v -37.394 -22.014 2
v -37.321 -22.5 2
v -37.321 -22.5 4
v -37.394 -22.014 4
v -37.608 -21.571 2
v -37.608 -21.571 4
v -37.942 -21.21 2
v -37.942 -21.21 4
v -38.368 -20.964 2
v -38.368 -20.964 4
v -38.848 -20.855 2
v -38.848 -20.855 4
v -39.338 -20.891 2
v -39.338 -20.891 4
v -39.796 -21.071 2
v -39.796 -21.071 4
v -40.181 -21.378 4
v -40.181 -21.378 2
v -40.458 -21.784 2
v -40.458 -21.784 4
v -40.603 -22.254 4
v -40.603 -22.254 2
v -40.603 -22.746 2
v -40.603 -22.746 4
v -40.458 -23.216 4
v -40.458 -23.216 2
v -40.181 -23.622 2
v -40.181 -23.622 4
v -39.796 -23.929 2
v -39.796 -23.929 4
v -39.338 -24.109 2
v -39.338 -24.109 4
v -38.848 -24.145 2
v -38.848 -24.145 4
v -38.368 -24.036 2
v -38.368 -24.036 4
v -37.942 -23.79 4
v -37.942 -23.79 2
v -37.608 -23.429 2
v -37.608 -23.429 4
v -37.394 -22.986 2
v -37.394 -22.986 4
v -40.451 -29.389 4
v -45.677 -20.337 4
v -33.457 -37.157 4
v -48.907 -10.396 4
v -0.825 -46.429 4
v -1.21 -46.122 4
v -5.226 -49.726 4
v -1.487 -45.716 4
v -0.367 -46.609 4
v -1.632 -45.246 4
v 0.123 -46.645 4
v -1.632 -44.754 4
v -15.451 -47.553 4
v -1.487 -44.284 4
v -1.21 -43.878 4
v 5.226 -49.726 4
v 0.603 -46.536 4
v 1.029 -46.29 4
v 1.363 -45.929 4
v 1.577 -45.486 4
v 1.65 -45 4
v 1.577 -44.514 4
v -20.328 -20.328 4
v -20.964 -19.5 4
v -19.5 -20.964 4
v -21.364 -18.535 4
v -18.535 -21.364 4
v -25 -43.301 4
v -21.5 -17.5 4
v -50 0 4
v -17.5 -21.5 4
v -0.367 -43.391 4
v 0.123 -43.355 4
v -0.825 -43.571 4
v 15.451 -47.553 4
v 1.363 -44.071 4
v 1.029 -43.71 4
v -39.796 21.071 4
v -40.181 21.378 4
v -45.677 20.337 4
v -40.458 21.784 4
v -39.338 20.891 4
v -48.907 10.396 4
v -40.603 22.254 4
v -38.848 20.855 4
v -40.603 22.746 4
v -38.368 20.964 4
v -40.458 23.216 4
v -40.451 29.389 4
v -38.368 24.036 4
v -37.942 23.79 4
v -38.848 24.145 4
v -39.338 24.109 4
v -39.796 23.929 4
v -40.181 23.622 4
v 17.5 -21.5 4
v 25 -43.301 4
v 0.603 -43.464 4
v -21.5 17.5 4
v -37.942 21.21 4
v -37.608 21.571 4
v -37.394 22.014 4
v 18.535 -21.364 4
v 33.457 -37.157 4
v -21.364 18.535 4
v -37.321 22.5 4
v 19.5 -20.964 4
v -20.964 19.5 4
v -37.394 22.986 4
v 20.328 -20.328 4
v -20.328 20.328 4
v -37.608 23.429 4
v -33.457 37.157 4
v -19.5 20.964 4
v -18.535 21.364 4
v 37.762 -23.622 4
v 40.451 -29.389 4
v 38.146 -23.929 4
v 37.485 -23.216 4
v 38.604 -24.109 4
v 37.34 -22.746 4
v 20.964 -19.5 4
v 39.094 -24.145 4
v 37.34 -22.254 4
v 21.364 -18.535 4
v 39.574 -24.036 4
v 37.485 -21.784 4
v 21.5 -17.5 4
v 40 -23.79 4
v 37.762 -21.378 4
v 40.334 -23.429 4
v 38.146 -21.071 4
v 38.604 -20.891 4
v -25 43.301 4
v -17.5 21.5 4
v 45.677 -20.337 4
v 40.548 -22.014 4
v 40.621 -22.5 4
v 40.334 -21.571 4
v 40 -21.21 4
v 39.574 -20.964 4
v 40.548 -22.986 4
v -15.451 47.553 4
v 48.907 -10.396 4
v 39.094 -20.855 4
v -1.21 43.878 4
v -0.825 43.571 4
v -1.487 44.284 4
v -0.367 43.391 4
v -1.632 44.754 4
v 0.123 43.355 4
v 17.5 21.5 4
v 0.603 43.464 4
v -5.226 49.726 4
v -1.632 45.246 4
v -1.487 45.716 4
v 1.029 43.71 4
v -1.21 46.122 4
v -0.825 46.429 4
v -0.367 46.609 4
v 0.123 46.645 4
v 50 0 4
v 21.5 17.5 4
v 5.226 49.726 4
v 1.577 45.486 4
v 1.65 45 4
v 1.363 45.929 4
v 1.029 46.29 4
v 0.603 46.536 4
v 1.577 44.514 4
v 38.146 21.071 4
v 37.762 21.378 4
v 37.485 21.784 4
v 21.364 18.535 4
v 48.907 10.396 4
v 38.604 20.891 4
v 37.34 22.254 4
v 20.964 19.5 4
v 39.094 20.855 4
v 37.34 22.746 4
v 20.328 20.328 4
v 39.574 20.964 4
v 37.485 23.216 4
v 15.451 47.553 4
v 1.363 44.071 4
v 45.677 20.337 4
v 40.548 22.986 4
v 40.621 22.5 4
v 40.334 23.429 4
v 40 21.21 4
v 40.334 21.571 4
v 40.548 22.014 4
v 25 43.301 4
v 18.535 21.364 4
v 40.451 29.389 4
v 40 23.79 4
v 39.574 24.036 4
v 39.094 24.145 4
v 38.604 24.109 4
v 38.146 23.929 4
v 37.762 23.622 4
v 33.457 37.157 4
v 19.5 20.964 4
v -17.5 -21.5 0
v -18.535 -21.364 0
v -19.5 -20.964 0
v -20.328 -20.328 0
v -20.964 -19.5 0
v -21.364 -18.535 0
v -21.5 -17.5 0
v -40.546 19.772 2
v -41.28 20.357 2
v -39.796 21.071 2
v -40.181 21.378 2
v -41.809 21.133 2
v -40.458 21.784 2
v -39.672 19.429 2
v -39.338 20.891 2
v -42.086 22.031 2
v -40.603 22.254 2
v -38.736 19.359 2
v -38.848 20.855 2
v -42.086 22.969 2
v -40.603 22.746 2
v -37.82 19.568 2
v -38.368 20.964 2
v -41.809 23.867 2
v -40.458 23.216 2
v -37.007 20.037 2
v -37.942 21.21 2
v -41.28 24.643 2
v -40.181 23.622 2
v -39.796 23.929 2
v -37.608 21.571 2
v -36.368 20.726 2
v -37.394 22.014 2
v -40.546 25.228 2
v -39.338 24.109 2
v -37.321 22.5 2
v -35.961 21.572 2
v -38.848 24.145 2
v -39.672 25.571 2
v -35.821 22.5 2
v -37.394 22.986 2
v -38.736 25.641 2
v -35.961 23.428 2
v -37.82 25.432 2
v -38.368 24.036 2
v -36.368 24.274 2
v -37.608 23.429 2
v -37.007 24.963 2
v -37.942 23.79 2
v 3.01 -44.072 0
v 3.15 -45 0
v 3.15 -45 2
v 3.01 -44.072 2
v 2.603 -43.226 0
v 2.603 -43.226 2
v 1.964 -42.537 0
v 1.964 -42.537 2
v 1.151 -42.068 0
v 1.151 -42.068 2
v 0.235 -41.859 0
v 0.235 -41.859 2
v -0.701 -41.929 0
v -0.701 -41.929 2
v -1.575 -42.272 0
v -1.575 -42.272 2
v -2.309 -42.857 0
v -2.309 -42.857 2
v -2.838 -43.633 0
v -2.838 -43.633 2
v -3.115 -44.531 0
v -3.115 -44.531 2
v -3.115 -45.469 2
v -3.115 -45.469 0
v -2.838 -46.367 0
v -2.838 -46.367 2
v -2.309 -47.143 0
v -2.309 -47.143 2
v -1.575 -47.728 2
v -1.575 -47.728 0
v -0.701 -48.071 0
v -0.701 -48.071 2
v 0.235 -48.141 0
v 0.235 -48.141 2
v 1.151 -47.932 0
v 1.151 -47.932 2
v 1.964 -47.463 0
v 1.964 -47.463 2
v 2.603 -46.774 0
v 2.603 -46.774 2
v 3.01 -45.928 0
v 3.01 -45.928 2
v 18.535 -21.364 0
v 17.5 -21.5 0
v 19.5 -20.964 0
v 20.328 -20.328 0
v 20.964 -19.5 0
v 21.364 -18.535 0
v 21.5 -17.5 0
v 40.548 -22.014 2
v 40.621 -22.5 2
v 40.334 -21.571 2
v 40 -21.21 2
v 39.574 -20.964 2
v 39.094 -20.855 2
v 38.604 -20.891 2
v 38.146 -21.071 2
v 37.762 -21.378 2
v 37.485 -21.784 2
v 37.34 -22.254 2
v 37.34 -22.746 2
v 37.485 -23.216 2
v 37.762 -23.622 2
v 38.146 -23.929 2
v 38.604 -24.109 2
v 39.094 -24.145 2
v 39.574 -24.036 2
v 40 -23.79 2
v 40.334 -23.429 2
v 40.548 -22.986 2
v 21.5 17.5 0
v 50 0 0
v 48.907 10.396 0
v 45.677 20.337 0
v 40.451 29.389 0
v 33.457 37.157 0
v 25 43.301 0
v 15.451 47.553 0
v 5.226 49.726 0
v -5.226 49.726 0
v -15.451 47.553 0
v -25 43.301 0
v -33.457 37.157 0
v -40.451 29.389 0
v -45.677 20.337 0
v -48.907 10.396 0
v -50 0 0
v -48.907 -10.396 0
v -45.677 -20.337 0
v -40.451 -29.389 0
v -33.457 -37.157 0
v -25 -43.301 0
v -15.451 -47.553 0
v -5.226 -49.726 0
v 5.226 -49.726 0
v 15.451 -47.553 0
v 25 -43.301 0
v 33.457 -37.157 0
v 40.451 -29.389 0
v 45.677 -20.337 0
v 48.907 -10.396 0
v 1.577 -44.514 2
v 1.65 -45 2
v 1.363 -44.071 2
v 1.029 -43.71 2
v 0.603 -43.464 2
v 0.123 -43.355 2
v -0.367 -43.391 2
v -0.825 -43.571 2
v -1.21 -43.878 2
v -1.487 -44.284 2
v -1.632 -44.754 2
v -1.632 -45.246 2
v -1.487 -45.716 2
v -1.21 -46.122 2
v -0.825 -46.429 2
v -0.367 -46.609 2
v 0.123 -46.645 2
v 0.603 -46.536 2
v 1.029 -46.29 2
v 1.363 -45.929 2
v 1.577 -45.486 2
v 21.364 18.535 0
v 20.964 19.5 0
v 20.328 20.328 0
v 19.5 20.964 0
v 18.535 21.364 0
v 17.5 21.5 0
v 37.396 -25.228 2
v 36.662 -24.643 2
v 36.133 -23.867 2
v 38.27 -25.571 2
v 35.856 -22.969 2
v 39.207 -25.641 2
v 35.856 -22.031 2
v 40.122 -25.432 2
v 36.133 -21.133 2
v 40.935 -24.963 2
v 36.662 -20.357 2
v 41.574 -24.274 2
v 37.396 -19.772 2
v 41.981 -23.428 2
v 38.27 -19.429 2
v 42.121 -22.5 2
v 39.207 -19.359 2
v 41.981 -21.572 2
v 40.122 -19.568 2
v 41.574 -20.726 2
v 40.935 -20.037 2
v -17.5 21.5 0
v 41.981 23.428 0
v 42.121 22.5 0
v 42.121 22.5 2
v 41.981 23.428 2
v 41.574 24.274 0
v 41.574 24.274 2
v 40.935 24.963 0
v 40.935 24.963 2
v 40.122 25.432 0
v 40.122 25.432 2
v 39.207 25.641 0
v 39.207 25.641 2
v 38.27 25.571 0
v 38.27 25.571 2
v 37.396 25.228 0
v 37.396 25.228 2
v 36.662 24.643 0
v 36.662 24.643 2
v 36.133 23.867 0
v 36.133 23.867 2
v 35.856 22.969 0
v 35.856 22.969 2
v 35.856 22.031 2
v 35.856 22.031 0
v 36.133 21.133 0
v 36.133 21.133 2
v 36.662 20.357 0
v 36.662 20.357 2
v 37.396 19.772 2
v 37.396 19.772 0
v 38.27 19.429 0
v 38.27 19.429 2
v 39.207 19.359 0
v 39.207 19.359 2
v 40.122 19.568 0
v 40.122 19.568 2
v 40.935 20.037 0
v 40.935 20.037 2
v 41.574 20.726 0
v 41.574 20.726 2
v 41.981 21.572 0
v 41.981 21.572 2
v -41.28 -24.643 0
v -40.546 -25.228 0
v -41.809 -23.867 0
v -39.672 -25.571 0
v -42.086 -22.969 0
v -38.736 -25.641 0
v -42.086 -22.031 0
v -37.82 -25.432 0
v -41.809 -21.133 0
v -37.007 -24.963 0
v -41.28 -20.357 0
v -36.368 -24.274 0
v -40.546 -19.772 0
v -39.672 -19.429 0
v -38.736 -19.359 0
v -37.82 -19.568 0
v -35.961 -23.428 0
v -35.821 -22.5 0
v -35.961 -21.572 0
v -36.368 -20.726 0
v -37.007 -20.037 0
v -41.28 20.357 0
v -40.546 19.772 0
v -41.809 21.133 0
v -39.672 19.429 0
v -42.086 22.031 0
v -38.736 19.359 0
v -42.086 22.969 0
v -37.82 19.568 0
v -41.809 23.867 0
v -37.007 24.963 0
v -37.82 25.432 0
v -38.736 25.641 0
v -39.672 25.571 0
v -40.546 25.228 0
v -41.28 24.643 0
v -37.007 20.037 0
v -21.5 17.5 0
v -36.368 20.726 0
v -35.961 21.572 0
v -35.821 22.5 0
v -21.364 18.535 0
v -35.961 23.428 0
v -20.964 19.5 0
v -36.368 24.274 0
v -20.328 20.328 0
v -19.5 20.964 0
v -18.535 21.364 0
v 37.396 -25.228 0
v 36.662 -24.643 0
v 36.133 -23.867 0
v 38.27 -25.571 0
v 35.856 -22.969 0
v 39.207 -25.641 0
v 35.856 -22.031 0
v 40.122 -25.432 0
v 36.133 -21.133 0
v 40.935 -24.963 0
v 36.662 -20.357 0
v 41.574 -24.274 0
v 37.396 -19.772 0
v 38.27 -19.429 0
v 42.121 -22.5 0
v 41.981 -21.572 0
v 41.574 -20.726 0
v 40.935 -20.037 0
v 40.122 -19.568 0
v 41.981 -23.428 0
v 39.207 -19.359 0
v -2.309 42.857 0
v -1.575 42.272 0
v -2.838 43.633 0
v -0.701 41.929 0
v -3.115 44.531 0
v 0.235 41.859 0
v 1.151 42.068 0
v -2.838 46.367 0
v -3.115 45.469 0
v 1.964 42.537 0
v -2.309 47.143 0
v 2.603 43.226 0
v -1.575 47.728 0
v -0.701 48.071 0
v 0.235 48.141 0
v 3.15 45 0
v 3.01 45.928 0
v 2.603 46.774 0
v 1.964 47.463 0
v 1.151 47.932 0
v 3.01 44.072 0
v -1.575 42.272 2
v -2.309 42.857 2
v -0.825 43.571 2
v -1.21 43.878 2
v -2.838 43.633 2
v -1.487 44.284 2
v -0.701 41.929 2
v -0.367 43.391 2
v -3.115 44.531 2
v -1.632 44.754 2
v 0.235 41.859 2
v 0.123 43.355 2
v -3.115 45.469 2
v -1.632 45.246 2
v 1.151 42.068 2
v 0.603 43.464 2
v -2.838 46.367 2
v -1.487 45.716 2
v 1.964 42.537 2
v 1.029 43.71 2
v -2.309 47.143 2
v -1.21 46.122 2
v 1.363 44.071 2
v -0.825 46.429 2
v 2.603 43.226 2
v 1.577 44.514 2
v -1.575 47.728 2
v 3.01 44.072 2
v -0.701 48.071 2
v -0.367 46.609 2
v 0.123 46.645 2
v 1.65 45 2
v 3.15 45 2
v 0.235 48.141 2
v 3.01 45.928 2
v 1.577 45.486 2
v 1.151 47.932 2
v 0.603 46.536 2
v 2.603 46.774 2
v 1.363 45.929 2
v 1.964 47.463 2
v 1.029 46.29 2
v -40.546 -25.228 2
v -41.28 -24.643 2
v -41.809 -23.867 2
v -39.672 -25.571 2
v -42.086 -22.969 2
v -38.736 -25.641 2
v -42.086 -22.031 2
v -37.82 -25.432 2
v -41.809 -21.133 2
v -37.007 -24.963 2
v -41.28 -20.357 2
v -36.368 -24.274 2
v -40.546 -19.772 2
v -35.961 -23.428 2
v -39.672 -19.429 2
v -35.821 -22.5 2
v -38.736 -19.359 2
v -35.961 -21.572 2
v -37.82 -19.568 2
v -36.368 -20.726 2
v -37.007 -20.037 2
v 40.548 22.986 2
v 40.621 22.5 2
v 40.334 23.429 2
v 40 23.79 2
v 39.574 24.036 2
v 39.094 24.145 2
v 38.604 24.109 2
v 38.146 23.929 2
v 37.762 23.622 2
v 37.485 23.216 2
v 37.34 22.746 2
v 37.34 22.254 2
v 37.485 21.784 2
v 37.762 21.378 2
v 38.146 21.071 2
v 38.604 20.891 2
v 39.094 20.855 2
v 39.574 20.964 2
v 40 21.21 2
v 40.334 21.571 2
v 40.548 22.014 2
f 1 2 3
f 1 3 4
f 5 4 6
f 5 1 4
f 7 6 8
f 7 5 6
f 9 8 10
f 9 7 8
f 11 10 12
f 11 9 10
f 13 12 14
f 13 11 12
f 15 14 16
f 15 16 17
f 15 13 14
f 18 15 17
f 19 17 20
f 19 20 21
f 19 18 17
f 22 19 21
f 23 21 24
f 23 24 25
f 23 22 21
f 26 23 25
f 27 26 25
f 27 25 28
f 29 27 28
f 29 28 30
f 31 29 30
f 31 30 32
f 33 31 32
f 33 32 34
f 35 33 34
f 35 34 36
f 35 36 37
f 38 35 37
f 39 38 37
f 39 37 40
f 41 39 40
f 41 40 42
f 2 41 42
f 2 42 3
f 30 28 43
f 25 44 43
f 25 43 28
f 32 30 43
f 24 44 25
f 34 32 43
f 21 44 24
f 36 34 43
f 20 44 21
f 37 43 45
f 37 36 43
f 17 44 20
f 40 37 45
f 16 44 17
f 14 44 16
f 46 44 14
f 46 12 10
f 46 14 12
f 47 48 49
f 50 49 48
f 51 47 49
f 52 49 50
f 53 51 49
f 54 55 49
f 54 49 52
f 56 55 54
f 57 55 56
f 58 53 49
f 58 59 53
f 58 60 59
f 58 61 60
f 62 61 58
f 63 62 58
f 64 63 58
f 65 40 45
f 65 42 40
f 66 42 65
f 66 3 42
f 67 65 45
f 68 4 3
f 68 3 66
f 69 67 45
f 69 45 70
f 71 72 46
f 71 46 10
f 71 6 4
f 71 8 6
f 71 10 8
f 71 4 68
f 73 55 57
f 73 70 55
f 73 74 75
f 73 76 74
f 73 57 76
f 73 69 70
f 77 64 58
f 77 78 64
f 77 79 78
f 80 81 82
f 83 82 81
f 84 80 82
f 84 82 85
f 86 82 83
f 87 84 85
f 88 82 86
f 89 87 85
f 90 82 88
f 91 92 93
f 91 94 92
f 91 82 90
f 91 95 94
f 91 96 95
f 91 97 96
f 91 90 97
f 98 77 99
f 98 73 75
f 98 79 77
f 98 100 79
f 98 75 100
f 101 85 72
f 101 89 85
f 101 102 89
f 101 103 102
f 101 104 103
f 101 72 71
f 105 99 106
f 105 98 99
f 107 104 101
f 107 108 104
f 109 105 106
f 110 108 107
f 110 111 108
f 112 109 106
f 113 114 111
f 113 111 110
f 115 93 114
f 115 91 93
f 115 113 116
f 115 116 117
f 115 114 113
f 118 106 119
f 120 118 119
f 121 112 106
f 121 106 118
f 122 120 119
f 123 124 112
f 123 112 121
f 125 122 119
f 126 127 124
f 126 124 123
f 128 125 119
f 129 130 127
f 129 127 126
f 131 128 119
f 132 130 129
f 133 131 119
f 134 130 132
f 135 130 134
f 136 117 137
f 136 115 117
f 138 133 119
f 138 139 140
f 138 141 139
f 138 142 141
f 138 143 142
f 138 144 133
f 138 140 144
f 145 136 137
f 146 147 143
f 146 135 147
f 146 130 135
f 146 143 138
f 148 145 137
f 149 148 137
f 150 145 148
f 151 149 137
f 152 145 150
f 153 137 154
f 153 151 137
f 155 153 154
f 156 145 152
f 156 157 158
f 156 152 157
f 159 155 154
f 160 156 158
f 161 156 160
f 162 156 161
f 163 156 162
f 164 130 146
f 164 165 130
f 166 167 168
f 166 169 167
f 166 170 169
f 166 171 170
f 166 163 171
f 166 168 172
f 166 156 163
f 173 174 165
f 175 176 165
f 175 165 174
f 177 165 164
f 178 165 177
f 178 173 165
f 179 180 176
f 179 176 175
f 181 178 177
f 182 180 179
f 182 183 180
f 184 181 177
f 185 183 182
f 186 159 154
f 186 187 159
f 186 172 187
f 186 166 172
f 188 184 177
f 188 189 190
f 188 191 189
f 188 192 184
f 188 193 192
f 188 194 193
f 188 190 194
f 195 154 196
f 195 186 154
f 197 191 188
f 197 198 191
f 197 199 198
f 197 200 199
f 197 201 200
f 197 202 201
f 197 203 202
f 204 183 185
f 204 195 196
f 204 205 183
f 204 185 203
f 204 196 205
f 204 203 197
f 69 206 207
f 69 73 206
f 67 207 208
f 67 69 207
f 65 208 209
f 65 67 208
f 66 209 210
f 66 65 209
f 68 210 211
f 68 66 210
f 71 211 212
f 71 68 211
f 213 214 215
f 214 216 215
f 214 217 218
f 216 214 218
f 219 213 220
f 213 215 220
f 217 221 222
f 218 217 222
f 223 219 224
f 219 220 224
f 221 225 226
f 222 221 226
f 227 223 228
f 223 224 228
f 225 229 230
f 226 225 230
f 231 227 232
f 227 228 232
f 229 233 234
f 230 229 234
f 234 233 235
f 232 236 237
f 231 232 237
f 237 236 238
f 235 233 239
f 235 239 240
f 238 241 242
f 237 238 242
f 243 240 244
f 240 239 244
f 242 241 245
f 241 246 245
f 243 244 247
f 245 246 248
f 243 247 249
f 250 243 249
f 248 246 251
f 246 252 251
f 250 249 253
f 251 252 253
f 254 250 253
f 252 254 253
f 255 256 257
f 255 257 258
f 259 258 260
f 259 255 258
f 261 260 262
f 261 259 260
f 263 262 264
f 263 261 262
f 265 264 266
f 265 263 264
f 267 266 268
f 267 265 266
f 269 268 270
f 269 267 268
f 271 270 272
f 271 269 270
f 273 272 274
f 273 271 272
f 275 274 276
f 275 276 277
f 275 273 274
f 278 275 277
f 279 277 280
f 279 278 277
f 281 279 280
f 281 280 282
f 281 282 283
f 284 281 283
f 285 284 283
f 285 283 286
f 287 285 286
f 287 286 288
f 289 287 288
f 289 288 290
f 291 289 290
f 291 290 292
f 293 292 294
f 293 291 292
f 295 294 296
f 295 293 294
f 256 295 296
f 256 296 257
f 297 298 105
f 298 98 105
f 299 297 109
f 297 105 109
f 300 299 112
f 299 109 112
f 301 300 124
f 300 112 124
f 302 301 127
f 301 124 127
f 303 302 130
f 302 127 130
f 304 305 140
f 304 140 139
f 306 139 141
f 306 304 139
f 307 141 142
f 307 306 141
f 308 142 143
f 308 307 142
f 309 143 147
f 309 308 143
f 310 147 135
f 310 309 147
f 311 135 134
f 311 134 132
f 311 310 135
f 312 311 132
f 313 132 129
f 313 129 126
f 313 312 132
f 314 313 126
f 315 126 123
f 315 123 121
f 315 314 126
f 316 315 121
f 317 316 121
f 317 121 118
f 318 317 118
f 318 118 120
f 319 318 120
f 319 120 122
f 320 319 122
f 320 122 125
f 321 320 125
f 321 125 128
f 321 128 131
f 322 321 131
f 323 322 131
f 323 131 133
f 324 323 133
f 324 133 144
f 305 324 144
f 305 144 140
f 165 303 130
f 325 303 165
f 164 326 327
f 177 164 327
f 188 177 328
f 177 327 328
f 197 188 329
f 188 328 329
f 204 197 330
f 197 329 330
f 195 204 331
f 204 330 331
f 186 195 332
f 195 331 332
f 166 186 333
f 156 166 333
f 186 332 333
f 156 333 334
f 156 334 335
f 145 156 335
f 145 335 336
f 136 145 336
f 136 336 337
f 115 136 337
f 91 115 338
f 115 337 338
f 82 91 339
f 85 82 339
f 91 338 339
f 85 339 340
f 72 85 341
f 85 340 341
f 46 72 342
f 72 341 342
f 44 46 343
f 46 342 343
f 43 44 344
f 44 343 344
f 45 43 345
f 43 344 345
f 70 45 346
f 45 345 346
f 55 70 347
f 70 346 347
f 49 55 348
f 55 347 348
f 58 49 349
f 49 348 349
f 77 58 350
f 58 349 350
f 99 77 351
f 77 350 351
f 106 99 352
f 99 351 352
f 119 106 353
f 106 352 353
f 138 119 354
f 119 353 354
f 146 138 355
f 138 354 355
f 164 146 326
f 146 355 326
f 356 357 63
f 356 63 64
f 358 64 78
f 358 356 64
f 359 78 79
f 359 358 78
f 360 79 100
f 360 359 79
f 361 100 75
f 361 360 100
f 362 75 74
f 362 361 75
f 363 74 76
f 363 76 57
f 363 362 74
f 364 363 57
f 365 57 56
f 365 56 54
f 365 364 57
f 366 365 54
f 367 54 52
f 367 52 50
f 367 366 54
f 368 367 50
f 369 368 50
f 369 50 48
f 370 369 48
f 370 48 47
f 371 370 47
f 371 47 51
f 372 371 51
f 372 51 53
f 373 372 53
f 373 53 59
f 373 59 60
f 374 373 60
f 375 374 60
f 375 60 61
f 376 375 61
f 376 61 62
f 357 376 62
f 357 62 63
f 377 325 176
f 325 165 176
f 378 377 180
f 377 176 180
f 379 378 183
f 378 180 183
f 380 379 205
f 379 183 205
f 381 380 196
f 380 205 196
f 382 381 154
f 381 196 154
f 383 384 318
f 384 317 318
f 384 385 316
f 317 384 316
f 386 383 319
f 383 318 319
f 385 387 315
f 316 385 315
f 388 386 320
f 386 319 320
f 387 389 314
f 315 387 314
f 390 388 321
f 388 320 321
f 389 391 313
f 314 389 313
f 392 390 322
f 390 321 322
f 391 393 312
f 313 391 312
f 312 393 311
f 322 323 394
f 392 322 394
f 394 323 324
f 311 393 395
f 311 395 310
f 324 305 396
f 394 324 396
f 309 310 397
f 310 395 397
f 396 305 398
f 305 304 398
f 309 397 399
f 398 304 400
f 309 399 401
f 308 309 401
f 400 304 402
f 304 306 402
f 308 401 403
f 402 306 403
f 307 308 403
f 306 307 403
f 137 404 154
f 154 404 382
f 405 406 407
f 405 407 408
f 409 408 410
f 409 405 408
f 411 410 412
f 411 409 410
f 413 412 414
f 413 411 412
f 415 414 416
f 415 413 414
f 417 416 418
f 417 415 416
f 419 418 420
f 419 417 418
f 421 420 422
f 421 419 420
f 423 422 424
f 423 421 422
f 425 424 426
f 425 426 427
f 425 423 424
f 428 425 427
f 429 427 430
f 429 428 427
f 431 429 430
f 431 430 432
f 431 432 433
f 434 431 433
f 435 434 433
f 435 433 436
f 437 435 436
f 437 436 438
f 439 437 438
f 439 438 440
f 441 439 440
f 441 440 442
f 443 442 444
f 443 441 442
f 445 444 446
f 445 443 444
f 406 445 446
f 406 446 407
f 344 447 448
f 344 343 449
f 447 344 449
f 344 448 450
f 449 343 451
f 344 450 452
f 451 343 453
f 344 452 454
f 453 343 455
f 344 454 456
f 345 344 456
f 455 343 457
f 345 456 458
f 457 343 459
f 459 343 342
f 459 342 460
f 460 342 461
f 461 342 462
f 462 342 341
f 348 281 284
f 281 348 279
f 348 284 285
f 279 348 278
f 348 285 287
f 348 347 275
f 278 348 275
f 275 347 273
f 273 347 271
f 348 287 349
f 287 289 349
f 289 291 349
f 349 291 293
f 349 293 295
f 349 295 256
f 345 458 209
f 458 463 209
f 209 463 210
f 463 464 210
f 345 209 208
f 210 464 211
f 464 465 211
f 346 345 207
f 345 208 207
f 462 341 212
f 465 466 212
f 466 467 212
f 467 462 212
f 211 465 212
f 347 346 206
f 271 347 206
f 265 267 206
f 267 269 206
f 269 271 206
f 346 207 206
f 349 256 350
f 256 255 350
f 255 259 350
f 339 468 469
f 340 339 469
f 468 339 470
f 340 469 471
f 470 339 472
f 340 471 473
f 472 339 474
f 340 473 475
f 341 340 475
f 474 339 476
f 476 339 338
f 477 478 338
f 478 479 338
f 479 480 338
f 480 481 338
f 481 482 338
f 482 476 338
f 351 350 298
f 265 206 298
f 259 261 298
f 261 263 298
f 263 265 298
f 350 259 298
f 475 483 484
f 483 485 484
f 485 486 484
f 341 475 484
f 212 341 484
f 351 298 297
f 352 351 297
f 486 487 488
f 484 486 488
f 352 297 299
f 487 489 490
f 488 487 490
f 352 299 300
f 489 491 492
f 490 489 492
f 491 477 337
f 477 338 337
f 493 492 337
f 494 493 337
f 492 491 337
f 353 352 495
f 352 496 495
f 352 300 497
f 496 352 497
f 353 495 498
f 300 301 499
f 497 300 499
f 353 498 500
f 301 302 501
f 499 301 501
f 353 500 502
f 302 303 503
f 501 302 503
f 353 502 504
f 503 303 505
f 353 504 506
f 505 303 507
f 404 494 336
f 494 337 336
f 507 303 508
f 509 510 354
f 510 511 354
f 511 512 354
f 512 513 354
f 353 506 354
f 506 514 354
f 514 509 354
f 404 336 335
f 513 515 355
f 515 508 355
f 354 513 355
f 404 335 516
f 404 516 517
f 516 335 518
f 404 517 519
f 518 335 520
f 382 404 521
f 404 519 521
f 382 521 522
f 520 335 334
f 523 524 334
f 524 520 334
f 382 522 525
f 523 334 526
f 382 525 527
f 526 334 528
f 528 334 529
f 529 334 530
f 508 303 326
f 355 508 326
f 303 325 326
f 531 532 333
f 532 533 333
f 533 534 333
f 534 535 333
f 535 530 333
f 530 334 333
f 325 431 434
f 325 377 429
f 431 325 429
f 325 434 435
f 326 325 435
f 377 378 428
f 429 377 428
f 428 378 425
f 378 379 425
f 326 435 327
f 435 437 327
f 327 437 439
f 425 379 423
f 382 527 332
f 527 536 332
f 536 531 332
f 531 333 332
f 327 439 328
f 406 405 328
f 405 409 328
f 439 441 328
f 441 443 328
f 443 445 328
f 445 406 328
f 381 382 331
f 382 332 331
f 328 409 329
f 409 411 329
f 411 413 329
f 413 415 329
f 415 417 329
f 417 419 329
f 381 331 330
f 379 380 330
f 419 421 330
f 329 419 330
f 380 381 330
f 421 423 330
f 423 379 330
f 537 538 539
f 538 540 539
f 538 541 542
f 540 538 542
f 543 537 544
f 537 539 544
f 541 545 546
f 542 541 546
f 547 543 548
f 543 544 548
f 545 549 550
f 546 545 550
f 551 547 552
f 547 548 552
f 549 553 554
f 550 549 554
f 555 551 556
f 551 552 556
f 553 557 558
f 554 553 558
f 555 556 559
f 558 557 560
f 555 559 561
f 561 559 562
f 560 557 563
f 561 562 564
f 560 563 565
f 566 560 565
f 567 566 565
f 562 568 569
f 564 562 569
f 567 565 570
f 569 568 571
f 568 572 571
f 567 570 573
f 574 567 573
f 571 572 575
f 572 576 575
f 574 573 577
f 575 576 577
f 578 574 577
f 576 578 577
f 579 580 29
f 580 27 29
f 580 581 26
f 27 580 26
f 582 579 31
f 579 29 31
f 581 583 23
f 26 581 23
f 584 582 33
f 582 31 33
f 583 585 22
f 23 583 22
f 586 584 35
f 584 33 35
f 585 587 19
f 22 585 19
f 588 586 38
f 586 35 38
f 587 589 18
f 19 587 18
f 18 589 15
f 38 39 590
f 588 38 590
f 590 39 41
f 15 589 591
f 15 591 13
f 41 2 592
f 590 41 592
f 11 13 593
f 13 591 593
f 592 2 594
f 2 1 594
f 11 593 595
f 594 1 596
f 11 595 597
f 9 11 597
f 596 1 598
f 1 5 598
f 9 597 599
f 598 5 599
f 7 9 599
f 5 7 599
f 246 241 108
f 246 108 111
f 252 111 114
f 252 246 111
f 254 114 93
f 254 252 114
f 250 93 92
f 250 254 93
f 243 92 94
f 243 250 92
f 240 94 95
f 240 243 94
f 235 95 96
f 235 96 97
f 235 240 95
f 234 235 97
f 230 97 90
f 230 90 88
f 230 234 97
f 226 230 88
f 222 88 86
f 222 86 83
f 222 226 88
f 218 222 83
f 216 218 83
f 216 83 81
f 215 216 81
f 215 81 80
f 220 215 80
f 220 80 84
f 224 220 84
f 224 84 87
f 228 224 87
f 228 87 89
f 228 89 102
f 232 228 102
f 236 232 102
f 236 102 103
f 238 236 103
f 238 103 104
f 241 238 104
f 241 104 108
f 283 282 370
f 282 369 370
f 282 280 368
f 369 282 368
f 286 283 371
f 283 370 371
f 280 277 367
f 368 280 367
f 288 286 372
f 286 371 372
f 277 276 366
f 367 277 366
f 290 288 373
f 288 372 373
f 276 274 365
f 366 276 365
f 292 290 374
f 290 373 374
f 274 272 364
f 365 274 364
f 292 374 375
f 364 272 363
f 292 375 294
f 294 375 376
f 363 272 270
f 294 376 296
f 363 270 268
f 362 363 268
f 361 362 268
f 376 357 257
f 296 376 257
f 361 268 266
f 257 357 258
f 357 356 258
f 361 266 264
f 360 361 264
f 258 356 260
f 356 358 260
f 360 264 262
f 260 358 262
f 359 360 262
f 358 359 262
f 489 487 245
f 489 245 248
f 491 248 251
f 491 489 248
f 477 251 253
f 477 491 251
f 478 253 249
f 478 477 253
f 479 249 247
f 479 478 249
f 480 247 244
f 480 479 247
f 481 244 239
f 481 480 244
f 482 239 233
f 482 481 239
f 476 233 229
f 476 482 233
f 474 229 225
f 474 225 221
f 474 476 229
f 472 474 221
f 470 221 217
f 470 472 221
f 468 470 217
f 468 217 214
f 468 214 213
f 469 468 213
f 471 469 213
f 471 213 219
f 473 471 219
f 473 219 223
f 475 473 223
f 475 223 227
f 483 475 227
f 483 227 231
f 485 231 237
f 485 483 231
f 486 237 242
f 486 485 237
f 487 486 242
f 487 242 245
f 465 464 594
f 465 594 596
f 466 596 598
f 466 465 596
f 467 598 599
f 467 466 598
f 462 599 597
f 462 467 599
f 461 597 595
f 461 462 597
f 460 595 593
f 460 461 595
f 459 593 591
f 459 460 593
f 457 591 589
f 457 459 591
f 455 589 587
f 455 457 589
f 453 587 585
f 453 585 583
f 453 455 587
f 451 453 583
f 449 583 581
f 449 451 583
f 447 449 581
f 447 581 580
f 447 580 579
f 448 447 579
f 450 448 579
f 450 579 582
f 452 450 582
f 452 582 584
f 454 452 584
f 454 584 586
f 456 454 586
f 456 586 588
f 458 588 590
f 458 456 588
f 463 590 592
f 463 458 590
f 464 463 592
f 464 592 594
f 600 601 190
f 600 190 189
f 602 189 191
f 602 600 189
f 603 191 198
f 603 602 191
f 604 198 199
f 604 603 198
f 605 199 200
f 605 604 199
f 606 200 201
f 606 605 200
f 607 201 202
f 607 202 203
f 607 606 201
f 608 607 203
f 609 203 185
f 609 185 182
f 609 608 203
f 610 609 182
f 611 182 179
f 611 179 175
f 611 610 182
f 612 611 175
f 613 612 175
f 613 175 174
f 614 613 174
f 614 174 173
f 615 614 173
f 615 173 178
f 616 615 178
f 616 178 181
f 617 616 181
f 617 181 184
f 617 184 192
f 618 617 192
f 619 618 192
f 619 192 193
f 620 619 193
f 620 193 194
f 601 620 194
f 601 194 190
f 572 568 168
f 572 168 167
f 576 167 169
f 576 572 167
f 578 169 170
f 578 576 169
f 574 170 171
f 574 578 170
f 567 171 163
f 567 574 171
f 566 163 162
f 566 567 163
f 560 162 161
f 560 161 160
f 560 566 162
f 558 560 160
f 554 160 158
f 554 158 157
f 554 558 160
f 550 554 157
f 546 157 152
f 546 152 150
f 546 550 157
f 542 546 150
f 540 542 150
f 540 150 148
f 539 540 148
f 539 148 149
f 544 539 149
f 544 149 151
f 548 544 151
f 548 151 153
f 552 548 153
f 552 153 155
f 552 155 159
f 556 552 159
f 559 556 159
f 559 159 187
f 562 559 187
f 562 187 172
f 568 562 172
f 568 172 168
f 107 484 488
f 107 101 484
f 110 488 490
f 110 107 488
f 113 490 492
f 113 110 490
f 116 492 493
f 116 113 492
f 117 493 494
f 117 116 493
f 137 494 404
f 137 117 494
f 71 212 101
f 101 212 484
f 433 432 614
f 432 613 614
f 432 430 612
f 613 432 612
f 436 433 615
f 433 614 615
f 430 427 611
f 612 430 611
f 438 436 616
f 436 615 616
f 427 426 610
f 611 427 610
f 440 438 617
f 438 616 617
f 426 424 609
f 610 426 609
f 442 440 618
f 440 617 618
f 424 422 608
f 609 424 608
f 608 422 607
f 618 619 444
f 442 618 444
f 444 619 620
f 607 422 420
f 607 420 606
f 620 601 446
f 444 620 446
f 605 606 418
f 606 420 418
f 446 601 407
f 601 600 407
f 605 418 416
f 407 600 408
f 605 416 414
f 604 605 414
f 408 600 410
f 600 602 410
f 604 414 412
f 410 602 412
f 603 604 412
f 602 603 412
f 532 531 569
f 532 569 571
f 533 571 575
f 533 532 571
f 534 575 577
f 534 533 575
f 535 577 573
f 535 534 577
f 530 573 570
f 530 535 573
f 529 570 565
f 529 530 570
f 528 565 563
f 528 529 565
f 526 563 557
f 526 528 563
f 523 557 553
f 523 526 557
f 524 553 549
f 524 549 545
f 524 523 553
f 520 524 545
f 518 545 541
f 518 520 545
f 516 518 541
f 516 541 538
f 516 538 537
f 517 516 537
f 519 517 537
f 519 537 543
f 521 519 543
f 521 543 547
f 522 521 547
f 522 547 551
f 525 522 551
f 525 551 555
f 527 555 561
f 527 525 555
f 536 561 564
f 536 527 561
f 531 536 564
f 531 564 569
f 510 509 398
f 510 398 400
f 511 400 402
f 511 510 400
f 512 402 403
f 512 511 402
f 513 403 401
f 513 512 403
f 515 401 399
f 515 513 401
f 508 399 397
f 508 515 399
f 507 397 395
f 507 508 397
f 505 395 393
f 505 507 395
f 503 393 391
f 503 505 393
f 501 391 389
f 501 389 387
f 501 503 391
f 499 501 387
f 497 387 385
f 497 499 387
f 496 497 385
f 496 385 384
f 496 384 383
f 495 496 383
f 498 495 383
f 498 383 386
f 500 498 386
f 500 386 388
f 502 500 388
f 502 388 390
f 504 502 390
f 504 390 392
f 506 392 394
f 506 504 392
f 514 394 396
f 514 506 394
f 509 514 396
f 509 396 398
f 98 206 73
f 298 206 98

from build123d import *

# Parameters (mm, degrees)
SKETCH_1_R          = 50
SKETCH_1_R_2        = 1.65
SKETCH_1_W          = 43
SKETCH_1_H          = 43
EXTRUDE_1_DEPTH     = 4
SKETCH_2_R          = 3.15
CUT_EXTRUDE_1_DEPTH = 2
FILLET_1_R          = 4


with BuildPart() as part:
    # 草图1 → 凸台-拉伸1 (new body)
    with BuildSketch(Plane.XY):
        Circle(SKETCH_1_R)
        with Locations((-38.97114317, 22.5)):
            Circle(SKETCH_1_R_2, mode=Mode.SUBTRACT)
        with Locations((0, 45)):
            Circle(SKETCH_1_R_2, mode=Mode.SUBTRACT)
        with Locations((38.97114317, 22.5)):
            Circle(SKETCH_1_R_2, mode=Mode.SUBTRACT)
        with Locations((38.97114317, -22.5)):
            Circle(SKETCH_1_R_2, mode=Mode.SUBTRACT)
        with Locations((0, -45)):
            Circle(SKETCH_1_R_2, mode=Mode.SUBTRACT)
        with Locations((-38.97114317, -22.5)):
            Circle(SKETCH_1_R_2, mode=Mode.SUBTRACT)
        Rectangle(SKETCH_1_W, SKETCH_1_H, mode=Mode.SUBTRACT)
    extrude(amount=EXTRUDE_1_DEPTH)

    # 草图2 → 切除-拉伸1 (cut)
    with BuildSketch(Plane.XY):
        with Locations((0, 45)):
            Circle(SKETCH_2_R)
        with Locations((38.97114317, 22.5)):
            Circle(SKETCH_2_R)
        with Locations((38.97114317, -22.5)):
            Circle(SKETCH_2_R)
        with Locations((0, -45)):
            Circle(SKETCH_2_R)
        with Locations((-38.97114317, -22.5)):
            Circle(SKETCH_2_R)
        with Locations((-38.97114317, 22.5)):
            Circle(SKETCH_2_R)
    extrude(amount=CUT_EXTRUDE_1_DEPTH, mode=Mode.SUBTRACT)

    # 圆角1
    fillet_1_edges = [part.edges().sort_by_distance(p)[0] for p in [
        (21.5, -21.5, 2),
        (21.5, 21.5, 2),
        (-21.5, 21.5, 2),
        (-21.5, -21.5, 2),
    ]]
    fillet(fillet_1_edges, radius=FILLET_1_R)


solid = part.part
